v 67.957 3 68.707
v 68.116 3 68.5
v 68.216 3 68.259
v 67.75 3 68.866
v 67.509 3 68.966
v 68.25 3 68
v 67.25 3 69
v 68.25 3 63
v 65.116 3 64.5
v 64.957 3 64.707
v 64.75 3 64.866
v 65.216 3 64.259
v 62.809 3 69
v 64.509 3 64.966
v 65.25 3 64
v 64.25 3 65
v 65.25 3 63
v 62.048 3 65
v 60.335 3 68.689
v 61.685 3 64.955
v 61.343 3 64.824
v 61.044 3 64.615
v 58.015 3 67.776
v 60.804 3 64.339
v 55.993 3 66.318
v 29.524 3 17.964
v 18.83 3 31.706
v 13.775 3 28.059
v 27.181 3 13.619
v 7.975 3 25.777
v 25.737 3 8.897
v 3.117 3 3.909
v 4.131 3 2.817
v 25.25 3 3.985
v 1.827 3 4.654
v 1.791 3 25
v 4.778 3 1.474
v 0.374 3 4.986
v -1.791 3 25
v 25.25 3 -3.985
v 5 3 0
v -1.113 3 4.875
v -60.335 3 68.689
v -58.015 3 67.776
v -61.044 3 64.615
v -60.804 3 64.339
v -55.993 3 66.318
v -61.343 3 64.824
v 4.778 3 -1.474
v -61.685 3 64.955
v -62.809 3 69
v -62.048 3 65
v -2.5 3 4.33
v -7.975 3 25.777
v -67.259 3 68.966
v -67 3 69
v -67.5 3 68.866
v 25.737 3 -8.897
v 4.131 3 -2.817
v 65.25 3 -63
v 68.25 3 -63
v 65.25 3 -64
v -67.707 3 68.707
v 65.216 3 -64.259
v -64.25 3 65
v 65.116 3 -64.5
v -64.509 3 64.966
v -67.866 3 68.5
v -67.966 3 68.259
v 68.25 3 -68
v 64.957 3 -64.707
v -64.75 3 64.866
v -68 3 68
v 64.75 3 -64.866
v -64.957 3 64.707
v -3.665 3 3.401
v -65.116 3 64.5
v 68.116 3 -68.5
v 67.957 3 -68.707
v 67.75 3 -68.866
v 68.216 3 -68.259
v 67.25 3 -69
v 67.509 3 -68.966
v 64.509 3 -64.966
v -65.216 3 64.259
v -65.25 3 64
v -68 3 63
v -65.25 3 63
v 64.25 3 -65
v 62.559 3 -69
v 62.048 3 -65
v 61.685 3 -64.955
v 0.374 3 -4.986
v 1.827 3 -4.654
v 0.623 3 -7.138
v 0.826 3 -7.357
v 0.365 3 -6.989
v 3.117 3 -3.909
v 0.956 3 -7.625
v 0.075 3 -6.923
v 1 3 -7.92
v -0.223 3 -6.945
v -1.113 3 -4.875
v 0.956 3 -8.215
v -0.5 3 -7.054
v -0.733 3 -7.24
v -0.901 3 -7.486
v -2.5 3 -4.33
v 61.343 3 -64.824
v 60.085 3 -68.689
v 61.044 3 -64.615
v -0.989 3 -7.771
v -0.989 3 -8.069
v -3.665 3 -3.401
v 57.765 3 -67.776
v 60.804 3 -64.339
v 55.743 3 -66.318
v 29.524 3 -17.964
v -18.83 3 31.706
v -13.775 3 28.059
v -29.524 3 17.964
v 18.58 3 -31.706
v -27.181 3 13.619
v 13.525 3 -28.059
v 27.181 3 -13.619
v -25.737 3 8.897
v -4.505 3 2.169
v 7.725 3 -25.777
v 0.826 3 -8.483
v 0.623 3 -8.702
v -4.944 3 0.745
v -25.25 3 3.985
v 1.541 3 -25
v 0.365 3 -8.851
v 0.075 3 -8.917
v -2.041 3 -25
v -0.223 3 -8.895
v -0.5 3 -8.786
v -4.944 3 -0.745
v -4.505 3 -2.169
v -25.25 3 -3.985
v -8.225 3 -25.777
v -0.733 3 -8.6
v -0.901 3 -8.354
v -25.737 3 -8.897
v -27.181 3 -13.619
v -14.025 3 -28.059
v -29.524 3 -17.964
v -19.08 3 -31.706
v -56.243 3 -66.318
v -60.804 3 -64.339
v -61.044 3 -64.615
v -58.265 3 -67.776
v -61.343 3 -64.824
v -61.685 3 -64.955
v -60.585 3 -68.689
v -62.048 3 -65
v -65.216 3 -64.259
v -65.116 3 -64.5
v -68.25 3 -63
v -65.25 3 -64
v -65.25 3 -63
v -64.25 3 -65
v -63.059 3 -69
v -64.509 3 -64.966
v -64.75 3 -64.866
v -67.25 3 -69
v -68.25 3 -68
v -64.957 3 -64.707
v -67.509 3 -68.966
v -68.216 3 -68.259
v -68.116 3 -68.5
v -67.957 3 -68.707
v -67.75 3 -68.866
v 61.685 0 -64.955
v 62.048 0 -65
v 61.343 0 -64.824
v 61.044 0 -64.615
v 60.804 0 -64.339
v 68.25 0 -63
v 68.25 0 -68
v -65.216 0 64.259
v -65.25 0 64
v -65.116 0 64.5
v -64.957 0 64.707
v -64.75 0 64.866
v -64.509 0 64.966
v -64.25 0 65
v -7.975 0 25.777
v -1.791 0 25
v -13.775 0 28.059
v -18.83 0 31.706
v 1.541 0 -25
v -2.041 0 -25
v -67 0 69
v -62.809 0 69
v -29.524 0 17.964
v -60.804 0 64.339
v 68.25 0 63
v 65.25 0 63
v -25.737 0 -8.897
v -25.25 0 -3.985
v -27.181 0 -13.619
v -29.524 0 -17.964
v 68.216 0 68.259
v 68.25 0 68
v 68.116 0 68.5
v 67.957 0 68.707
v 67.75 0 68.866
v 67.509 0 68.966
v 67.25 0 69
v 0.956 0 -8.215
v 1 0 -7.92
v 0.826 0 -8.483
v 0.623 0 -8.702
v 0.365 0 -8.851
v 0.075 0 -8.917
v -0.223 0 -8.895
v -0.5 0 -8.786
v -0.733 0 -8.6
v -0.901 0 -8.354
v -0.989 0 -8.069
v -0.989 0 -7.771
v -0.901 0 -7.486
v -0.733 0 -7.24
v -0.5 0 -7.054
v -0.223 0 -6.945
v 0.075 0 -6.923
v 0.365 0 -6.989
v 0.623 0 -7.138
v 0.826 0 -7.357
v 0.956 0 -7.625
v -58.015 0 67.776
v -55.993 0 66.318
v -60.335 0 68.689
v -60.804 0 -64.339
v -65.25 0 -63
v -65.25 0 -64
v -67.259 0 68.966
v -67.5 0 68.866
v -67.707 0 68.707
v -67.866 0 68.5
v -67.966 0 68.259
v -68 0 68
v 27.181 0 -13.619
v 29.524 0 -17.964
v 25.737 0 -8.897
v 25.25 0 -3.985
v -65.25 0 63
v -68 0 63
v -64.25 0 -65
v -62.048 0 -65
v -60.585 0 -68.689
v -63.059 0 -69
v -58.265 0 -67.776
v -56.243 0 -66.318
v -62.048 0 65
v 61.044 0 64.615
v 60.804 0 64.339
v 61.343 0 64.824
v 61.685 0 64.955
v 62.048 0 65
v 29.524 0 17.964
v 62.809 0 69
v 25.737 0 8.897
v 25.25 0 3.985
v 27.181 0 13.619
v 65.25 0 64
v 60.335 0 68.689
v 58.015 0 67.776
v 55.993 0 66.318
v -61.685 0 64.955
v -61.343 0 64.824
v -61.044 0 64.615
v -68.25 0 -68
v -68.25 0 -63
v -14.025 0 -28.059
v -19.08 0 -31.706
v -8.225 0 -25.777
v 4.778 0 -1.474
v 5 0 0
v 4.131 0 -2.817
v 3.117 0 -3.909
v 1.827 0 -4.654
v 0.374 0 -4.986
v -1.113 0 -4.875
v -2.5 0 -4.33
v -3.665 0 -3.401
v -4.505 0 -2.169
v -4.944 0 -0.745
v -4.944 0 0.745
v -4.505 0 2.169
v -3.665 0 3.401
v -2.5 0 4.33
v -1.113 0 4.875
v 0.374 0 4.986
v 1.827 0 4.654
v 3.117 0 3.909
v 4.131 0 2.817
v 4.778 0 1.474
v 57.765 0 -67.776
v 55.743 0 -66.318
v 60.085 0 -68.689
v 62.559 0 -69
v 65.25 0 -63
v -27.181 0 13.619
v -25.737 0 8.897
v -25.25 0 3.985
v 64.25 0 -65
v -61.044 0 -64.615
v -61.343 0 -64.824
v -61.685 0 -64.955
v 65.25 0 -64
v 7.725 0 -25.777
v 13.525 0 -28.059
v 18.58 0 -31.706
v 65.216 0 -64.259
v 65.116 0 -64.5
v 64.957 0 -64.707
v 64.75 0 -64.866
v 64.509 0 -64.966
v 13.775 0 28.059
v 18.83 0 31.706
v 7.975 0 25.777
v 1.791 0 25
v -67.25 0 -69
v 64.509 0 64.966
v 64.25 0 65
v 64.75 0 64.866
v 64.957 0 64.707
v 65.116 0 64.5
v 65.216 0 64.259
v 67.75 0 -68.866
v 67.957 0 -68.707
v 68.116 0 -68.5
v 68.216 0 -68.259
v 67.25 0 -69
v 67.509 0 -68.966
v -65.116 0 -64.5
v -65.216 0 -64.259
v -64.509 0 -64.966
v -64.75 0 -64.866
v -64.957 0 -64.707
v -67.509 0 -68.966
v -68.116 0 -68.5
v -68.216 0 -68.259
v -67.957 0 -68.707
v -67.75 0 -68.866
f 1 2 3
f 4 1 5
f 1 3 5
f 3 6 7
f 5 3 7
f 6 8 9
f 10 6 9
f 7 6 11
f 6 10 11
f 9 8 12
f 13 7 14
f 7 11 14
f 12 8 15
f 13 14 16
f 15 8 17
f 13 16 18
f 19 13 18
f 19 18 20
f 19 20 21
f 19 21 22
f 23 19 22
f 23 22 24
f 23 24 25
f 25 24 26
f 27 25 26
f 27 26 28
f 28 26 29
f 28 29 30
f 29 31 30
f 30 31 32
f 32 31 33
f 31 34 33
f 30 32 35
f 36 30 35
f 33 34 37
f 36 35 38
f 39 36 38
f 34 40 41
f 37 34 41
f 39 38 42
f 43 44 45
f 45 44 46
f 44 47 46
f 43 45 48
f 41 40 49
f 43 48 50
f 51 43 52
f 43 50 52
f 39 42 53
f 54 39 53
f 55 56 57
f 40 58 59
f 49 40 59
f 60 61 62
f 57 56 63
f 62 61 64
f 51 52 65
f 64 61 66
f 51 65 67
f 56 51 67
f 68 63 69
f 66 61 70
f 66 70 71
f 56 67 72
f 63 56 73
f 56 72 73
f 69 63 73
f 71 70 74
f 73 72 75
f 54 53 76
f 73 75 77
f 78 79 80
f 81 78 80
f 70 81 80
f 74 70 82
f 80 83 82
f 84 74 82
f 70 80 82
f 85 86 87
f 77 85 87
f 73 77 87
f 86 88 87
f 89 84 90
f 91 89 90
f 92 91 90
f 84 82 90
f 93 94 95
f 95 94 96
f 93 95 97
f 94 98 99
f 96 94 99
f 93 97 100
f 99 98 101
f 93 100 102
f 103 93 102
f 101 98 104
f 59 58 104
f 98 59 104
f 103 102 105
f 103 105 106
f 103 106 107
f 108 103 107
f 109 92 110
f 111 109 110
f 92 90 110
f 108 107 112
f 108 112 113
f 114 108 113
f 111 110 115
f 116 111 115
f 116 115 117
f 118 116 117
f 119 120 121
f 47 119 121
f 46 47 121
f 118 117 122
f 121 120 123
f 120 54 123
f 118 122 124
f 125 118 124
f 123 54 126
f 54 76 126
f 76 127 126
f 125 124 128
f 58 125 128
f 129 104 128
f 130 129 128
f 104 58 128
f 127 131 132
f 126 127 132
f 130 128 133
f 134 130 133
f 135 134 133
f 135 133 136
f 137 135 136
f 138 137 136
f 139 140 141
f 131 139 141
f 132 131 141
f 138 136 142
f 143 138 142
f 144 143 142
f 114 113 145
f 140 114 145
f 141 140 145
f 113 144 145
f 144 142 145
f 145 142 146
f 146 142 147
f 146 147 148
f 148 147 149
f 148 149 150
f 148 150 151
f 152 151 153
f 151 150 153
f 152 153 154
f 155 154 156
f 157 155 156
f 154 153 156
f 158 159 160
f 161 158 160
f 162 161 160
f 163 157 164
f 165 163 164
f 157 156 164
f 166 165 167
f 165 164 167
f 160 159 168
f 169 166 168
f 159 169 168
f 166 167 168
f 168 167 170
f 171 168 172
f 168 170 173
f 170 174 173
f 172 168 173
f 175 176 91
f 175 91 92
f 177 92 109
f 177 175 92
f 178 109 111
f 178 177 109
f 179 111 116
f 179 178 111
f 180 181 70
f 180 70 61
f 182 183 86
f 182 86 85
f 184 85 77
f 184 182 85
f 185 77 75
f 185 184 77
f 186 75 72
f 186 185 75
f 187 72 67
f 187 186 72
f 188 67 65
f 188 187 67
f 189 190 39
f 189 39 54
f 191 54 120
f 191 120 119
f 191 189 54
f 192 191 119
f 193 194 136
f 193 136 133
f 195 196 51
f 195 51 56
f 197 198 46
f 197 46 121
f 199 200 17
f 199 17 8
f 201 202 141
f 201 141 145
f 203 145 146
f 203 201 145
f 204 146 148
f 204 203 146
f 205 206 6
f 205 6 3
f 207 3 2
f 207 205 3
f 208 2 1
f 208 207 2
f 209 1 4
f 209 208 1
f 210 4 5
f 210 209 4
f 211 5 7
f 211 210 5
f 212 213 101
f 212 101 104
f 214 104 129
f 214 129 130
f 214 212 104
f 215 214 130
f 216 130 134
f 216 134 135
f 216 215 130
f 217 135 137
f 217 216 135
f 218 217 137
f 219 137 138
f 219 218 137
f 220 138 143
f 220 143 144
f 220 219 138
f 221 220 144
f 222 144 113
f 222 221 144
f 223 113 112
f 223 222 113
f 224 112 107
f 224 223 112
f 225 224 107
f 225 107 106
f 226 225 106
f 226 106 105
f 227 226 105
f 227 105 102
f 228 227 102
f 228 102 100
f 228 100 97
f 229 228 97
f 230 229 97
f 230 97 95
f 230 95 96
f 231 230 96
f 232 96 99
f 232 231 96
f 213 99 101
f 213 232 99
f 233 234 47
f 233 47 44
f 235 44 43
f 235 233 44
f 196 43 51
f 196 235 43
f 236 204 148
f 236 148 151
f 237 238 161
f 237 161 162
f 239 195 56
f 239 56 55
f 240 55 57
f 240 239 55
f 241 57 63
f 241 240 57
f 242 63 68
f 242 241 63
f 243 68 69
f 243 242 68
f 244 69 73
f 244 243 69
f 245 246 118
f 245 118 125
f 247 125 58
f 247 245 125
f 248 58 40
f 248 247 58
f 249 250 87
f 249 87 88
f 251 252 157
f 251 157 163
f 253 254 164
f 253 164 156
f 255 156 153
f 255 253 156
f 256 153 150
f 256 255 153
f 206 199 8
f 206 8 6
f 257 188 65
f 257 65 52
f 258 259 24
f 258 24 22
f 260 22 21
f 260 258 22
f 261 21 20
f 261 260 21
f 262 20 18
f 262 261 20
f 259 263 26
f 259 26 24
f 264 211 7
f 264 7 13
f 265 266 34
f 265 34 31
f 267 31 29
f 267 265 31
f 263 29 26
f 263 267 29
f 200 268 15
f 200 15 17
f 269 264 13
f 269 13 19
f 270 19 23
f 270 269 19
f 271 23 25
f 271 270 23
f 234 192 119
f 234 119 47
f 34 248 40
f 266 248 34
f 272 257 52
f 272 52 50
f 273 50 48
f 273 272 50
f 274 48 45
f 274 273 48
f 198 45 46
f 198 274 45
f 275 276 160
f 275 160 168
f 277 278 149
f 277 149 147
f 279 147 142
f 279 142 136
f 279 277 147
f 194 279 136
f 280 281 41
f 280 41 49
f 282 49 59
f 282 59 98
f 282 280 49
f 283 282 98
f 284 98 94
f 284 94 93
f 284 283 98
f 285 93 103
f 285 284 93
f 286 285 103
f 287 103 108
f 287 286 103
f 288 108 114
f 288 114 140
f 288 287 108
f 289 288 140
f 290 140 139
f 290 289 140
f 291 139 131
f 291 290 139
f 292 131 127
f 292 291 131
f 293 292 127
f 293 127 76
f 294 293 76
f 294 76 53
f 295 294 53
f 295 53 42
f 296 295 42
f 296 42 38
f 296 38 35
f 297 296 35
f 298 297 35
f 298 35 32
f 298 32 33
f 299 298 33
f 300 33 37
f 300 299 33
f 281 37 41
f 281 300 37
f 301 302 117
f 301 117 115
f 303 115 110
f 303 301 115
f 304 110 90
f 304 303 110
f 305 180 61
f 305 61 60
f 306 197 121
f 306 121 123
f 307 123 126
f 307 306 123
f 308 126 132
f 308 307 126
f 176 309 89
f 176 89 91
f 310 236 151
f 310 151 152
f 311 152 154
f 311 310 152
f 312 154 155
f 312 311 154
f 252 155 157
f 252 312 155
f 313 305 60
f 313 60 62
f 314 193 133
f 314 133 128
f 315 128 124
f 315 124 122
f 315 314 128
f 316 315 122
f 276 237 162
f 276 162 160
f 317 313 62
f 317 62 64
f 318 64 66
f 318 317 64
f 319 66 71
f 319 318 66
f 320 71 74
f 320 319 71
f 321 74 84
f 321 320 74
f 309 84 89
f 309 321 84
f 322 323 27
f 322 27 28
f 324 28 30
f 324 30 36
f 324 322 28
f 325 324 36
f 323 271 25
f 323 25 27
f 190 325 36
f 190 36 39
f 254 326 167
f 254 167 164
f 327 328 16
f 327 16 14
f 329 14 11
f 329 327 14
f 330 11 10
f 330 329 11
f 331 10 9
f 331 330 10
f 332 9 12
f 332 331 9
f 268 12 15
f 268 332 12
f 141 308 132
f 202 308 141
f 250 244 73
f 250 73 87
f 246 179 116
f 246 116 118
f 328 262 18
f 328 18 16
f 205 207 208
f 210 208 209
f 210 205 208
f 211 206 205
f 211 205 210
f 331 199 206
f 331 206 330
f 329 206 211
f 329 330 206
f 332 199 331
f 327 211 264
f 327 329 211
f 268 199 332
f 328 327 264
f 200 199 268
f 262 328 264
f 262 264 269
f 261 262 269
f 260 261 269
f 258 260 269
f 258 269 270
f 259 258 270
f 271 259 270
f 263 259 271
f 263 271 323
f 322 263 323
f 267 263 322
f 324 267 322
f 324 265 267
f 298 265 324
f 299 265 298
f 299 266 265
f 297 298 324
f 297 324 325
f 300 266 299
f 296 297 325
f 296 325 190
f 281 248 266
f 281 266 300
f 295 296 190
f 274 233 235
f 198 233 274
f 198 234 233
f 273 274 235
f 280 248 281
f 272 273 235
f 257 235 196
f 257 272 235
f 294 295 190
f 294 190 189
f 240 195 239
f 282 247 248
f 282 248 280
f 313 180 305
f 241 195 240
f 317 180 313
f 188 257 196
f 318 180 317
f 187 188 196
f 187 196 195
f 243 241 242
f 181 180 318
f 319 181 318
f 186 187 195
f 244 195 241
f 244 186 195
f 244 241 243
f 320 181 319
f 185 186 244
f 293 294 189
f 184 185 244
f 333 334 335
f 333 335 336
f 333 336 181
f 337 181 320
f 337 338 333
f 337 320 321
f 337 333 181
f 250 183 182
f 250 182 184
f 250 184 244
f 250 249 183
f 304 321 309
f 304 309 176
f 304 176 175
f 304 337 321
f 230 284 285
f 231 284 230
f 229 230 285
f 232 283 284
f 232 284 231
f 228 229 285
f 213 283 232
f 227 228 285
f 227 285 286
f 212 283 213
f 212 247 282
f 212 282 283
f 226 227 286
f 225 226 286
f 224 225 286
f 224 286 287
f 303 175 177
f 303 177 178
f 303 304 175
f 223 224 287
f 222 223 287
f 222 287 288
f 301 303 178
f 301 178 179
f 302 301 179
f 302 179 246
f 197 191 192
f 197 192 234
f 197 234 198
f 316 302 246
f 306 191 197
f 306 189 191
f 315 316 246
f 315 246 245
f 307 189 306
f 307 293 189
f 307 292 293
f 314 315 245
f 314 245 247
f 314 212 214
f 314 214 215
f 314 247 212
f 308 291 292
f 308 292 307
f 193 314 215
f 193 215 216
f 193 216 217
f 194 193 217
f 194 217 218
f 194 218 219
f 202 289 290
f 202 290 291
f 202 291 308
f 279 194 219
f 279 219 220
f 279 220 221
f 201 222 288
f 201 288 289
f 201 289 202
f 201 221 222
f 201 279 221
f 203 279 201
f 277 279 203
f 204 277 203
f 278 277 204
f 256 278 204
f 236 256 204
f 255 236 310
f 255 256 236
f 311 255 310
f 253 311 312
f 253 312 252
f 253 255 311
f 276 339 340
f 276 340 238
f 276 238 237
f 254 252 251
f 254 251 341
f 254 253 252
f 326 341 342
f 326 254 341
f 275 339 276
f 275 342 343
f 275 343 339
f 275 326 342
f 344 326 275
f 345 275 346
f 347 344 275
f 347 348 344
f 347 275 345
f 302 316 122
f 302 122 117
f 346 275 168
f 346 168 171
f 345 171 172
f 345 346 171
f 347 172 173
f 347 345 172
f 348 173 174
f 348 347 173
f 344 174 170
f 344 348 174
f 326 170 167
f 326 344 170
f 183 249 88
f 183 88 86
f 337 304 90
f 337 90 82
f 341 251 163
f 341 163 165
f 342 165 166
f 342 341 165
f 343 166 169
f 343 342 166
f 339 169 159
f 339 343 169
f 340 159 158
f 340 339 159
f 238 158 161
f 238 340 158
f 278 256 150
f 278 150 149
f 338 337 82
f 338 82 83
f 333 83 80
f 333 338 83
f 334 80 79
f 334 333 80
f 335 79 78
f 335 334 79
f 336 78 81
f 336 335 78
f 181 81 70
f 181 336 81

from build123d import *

# Parameters (mm, degrees)
SKETCH1_R           = 5
SKETCH1_R_2         = 1
BOSS_EXTRUDE1_DEPTH = 3


with BuildPart() as part:
    # Sketch1 → Boss-Extrude1 (new body)
    with BuildSketch(Plane(origin=(0, 0, 0), x_dir=(1, 0, 0), z_dir=(0, 1, 0))):
        with BuildLine():
            Line((-65.25, 63), (-68.25, 63))
            Line((-68.25, 63), (-68.25, 68))
            ThreePointArc((-68.25, 68), (-67.957106781, 68.707106781), (-67.25, 69))
            Line((-67.25, 69), (-63.058671293, 69))
            ThreePointArc((-63.058671293, 69), (-59.396555712, 68.305316194), (-56.243242609, 66.317781894))
            Line((-56.243242609, 66.317781894), (-19.079799162, 31.705545266))
            ThreePointArc((-19.079799162, 31.705545266), (-11.196516404, 26.736709515), (-2.04122745, 25))
            Line((-2.04122745, 25), (1.54122745, 25))
            ThreePointArc((1.54122745, 25), (10.696516404, 26.736709515), (18.579799162, 31.705545266))
            Line((18.579799162, 31.705545266), (55.743242609, 66.317781894))
            ThreePointArc((55.743242609, 66.317781894), (58.896555712, 68.305316194), (62.558671293, 69))
            Line((62.558671293, 69), (67.25, 69))
            ThreePointArc((67.25, 69), (67.957106781, 68.707106781), (68.25, 68))
            Line((68.25, 68), (68.25, 63))
            Line((68.25, 63), (65.25, 63))
            Line((65.25, 63), (65.25, 64))
            ThreePointArc((65.25, 64), (64.957106781, 64.707106781), (64.25, 65))
            Line((64.25, 65), (62.047564147, 65))
            ThreePointArc((62.047564147, 65), (61.343356803, 64.824421389), (60.804007789, 64.338789355))
            Line((60.804007789, 64.338789355), (29.524060686, 17.964360684))
            ThreePointArc((29.524060686, 17.964360684), (26.342381101, 11.293830715), (25.25, 3.984538097))
            Line((25.25, 3.984538097), (25.25, -3.984538097))
            ThreePointArc((25.25, -3.984538097), (26.342381101, -11.293830715), (29.524060686, -17.964360684))
            Line((29.524060686, -17.964360684), (60.804007789, -64.338789355))
            ThreePointArc((60.804007789, -64.338789355), (61.343356803, -64.824421389), (62.047564147, -65))
            Line((62.047564147, -65), (64.25, -65))
            ThreePointArc((64.25, -65), (64.957106781, -64.707106781), (65.25, -64))
            Line((65.25, -64), (65.25, -63))
            Line((65.25, -63), (68.25, -63))
            Line((68.25, -63), (68.25, -68))
            ThreePointArc((68.25, -68), (67.957106781, -68.707106781), (67.25, -69))
            Line((67.25, -69), (62.808671293, -69))
            ThreePointArc((62.808671293, -69), (59.146555712, -68.305316194), (55.993242609, -66.317781894))
            Line((55.993242609, -66.317781894), (18.829799162, -31.705545266))
            ThreePointArc((18.829799162, -31.705545266), (10.946516404, -26.736709515), (1.79122745, -25))
            Line((1.79122745, -25), (-1.79122745, -25))
            ThreePointArc((-1.79122745, -25), (-10.946516404, -26.736709515), (-18.829799162, -31.705545266))
            Line((-18.829799162, -31.705545266), (-55.993242609, -66.317781894))
            ThreePointArc((-55.993242609, -66.317781894), (-59.146555712, -68.305316194), (-62.808671293, -69))
            Line((-62.808671293, -69), (-67, -69))
            ThreePointArc((-67, -69), (-67.707106781, -68.707106781), (-68, -68))
            Line((-68, -68), (-68, -63))
            Line((-68, -63), (-65.25, -63))
            Line((-65.25, -63), (-65.25, -64))
            ThreePointArc((-65.25, -64), (-64.957106781, -64.707106781), (-64.25, -65))
            Line((-64.25, -65), (-62.047564147, -65))
            ThreePointArc((-62.047564147, -65), (-61.343356803, -64.824421389), (-60.804007789, -64.338789355))
            Line((-60.804007789, -64.338789355), (-29.524060686, -17.964360684))
            ThreePointArc((-29.524060686, -17.964360684), (-26.342381101, -11.293830715), (-25.25, -3.984538097))
            Line((-25.25, -3.984538097), (-25.25, 3.984538097))
            ThreePointArc((-25.25, 3.984538097), (-26.342381101, 11.293830715), (-29.524060686, 17.964360684))
            Line((-29.524060686, 17.964360684), (-60.804007789, 64.338789355))
            ThreePointArc((-60.804007789, 64.338789355), (-61.343356803, 64.824421389), (-62.047564147, 65))
            Line((-62.047564147, 65), (-64.25, 65))
            ThreePointArc((-64.25, 65), (-64.957106781, 64.707106781), (-65.25, 64))
            Line((-65.25, 64), (-65.25, 63))
        make_face()
        Circle(SKETCH1_R, mode=Mode.SUBTRACT)
        with Locations((0, 7.92)):
            Circle(SKETCH1_R_2, mode=Mode.SUBTRACT)
    extrude(amount=BOSS_EXTRUDE1_DEPTH)


solid = part.part
